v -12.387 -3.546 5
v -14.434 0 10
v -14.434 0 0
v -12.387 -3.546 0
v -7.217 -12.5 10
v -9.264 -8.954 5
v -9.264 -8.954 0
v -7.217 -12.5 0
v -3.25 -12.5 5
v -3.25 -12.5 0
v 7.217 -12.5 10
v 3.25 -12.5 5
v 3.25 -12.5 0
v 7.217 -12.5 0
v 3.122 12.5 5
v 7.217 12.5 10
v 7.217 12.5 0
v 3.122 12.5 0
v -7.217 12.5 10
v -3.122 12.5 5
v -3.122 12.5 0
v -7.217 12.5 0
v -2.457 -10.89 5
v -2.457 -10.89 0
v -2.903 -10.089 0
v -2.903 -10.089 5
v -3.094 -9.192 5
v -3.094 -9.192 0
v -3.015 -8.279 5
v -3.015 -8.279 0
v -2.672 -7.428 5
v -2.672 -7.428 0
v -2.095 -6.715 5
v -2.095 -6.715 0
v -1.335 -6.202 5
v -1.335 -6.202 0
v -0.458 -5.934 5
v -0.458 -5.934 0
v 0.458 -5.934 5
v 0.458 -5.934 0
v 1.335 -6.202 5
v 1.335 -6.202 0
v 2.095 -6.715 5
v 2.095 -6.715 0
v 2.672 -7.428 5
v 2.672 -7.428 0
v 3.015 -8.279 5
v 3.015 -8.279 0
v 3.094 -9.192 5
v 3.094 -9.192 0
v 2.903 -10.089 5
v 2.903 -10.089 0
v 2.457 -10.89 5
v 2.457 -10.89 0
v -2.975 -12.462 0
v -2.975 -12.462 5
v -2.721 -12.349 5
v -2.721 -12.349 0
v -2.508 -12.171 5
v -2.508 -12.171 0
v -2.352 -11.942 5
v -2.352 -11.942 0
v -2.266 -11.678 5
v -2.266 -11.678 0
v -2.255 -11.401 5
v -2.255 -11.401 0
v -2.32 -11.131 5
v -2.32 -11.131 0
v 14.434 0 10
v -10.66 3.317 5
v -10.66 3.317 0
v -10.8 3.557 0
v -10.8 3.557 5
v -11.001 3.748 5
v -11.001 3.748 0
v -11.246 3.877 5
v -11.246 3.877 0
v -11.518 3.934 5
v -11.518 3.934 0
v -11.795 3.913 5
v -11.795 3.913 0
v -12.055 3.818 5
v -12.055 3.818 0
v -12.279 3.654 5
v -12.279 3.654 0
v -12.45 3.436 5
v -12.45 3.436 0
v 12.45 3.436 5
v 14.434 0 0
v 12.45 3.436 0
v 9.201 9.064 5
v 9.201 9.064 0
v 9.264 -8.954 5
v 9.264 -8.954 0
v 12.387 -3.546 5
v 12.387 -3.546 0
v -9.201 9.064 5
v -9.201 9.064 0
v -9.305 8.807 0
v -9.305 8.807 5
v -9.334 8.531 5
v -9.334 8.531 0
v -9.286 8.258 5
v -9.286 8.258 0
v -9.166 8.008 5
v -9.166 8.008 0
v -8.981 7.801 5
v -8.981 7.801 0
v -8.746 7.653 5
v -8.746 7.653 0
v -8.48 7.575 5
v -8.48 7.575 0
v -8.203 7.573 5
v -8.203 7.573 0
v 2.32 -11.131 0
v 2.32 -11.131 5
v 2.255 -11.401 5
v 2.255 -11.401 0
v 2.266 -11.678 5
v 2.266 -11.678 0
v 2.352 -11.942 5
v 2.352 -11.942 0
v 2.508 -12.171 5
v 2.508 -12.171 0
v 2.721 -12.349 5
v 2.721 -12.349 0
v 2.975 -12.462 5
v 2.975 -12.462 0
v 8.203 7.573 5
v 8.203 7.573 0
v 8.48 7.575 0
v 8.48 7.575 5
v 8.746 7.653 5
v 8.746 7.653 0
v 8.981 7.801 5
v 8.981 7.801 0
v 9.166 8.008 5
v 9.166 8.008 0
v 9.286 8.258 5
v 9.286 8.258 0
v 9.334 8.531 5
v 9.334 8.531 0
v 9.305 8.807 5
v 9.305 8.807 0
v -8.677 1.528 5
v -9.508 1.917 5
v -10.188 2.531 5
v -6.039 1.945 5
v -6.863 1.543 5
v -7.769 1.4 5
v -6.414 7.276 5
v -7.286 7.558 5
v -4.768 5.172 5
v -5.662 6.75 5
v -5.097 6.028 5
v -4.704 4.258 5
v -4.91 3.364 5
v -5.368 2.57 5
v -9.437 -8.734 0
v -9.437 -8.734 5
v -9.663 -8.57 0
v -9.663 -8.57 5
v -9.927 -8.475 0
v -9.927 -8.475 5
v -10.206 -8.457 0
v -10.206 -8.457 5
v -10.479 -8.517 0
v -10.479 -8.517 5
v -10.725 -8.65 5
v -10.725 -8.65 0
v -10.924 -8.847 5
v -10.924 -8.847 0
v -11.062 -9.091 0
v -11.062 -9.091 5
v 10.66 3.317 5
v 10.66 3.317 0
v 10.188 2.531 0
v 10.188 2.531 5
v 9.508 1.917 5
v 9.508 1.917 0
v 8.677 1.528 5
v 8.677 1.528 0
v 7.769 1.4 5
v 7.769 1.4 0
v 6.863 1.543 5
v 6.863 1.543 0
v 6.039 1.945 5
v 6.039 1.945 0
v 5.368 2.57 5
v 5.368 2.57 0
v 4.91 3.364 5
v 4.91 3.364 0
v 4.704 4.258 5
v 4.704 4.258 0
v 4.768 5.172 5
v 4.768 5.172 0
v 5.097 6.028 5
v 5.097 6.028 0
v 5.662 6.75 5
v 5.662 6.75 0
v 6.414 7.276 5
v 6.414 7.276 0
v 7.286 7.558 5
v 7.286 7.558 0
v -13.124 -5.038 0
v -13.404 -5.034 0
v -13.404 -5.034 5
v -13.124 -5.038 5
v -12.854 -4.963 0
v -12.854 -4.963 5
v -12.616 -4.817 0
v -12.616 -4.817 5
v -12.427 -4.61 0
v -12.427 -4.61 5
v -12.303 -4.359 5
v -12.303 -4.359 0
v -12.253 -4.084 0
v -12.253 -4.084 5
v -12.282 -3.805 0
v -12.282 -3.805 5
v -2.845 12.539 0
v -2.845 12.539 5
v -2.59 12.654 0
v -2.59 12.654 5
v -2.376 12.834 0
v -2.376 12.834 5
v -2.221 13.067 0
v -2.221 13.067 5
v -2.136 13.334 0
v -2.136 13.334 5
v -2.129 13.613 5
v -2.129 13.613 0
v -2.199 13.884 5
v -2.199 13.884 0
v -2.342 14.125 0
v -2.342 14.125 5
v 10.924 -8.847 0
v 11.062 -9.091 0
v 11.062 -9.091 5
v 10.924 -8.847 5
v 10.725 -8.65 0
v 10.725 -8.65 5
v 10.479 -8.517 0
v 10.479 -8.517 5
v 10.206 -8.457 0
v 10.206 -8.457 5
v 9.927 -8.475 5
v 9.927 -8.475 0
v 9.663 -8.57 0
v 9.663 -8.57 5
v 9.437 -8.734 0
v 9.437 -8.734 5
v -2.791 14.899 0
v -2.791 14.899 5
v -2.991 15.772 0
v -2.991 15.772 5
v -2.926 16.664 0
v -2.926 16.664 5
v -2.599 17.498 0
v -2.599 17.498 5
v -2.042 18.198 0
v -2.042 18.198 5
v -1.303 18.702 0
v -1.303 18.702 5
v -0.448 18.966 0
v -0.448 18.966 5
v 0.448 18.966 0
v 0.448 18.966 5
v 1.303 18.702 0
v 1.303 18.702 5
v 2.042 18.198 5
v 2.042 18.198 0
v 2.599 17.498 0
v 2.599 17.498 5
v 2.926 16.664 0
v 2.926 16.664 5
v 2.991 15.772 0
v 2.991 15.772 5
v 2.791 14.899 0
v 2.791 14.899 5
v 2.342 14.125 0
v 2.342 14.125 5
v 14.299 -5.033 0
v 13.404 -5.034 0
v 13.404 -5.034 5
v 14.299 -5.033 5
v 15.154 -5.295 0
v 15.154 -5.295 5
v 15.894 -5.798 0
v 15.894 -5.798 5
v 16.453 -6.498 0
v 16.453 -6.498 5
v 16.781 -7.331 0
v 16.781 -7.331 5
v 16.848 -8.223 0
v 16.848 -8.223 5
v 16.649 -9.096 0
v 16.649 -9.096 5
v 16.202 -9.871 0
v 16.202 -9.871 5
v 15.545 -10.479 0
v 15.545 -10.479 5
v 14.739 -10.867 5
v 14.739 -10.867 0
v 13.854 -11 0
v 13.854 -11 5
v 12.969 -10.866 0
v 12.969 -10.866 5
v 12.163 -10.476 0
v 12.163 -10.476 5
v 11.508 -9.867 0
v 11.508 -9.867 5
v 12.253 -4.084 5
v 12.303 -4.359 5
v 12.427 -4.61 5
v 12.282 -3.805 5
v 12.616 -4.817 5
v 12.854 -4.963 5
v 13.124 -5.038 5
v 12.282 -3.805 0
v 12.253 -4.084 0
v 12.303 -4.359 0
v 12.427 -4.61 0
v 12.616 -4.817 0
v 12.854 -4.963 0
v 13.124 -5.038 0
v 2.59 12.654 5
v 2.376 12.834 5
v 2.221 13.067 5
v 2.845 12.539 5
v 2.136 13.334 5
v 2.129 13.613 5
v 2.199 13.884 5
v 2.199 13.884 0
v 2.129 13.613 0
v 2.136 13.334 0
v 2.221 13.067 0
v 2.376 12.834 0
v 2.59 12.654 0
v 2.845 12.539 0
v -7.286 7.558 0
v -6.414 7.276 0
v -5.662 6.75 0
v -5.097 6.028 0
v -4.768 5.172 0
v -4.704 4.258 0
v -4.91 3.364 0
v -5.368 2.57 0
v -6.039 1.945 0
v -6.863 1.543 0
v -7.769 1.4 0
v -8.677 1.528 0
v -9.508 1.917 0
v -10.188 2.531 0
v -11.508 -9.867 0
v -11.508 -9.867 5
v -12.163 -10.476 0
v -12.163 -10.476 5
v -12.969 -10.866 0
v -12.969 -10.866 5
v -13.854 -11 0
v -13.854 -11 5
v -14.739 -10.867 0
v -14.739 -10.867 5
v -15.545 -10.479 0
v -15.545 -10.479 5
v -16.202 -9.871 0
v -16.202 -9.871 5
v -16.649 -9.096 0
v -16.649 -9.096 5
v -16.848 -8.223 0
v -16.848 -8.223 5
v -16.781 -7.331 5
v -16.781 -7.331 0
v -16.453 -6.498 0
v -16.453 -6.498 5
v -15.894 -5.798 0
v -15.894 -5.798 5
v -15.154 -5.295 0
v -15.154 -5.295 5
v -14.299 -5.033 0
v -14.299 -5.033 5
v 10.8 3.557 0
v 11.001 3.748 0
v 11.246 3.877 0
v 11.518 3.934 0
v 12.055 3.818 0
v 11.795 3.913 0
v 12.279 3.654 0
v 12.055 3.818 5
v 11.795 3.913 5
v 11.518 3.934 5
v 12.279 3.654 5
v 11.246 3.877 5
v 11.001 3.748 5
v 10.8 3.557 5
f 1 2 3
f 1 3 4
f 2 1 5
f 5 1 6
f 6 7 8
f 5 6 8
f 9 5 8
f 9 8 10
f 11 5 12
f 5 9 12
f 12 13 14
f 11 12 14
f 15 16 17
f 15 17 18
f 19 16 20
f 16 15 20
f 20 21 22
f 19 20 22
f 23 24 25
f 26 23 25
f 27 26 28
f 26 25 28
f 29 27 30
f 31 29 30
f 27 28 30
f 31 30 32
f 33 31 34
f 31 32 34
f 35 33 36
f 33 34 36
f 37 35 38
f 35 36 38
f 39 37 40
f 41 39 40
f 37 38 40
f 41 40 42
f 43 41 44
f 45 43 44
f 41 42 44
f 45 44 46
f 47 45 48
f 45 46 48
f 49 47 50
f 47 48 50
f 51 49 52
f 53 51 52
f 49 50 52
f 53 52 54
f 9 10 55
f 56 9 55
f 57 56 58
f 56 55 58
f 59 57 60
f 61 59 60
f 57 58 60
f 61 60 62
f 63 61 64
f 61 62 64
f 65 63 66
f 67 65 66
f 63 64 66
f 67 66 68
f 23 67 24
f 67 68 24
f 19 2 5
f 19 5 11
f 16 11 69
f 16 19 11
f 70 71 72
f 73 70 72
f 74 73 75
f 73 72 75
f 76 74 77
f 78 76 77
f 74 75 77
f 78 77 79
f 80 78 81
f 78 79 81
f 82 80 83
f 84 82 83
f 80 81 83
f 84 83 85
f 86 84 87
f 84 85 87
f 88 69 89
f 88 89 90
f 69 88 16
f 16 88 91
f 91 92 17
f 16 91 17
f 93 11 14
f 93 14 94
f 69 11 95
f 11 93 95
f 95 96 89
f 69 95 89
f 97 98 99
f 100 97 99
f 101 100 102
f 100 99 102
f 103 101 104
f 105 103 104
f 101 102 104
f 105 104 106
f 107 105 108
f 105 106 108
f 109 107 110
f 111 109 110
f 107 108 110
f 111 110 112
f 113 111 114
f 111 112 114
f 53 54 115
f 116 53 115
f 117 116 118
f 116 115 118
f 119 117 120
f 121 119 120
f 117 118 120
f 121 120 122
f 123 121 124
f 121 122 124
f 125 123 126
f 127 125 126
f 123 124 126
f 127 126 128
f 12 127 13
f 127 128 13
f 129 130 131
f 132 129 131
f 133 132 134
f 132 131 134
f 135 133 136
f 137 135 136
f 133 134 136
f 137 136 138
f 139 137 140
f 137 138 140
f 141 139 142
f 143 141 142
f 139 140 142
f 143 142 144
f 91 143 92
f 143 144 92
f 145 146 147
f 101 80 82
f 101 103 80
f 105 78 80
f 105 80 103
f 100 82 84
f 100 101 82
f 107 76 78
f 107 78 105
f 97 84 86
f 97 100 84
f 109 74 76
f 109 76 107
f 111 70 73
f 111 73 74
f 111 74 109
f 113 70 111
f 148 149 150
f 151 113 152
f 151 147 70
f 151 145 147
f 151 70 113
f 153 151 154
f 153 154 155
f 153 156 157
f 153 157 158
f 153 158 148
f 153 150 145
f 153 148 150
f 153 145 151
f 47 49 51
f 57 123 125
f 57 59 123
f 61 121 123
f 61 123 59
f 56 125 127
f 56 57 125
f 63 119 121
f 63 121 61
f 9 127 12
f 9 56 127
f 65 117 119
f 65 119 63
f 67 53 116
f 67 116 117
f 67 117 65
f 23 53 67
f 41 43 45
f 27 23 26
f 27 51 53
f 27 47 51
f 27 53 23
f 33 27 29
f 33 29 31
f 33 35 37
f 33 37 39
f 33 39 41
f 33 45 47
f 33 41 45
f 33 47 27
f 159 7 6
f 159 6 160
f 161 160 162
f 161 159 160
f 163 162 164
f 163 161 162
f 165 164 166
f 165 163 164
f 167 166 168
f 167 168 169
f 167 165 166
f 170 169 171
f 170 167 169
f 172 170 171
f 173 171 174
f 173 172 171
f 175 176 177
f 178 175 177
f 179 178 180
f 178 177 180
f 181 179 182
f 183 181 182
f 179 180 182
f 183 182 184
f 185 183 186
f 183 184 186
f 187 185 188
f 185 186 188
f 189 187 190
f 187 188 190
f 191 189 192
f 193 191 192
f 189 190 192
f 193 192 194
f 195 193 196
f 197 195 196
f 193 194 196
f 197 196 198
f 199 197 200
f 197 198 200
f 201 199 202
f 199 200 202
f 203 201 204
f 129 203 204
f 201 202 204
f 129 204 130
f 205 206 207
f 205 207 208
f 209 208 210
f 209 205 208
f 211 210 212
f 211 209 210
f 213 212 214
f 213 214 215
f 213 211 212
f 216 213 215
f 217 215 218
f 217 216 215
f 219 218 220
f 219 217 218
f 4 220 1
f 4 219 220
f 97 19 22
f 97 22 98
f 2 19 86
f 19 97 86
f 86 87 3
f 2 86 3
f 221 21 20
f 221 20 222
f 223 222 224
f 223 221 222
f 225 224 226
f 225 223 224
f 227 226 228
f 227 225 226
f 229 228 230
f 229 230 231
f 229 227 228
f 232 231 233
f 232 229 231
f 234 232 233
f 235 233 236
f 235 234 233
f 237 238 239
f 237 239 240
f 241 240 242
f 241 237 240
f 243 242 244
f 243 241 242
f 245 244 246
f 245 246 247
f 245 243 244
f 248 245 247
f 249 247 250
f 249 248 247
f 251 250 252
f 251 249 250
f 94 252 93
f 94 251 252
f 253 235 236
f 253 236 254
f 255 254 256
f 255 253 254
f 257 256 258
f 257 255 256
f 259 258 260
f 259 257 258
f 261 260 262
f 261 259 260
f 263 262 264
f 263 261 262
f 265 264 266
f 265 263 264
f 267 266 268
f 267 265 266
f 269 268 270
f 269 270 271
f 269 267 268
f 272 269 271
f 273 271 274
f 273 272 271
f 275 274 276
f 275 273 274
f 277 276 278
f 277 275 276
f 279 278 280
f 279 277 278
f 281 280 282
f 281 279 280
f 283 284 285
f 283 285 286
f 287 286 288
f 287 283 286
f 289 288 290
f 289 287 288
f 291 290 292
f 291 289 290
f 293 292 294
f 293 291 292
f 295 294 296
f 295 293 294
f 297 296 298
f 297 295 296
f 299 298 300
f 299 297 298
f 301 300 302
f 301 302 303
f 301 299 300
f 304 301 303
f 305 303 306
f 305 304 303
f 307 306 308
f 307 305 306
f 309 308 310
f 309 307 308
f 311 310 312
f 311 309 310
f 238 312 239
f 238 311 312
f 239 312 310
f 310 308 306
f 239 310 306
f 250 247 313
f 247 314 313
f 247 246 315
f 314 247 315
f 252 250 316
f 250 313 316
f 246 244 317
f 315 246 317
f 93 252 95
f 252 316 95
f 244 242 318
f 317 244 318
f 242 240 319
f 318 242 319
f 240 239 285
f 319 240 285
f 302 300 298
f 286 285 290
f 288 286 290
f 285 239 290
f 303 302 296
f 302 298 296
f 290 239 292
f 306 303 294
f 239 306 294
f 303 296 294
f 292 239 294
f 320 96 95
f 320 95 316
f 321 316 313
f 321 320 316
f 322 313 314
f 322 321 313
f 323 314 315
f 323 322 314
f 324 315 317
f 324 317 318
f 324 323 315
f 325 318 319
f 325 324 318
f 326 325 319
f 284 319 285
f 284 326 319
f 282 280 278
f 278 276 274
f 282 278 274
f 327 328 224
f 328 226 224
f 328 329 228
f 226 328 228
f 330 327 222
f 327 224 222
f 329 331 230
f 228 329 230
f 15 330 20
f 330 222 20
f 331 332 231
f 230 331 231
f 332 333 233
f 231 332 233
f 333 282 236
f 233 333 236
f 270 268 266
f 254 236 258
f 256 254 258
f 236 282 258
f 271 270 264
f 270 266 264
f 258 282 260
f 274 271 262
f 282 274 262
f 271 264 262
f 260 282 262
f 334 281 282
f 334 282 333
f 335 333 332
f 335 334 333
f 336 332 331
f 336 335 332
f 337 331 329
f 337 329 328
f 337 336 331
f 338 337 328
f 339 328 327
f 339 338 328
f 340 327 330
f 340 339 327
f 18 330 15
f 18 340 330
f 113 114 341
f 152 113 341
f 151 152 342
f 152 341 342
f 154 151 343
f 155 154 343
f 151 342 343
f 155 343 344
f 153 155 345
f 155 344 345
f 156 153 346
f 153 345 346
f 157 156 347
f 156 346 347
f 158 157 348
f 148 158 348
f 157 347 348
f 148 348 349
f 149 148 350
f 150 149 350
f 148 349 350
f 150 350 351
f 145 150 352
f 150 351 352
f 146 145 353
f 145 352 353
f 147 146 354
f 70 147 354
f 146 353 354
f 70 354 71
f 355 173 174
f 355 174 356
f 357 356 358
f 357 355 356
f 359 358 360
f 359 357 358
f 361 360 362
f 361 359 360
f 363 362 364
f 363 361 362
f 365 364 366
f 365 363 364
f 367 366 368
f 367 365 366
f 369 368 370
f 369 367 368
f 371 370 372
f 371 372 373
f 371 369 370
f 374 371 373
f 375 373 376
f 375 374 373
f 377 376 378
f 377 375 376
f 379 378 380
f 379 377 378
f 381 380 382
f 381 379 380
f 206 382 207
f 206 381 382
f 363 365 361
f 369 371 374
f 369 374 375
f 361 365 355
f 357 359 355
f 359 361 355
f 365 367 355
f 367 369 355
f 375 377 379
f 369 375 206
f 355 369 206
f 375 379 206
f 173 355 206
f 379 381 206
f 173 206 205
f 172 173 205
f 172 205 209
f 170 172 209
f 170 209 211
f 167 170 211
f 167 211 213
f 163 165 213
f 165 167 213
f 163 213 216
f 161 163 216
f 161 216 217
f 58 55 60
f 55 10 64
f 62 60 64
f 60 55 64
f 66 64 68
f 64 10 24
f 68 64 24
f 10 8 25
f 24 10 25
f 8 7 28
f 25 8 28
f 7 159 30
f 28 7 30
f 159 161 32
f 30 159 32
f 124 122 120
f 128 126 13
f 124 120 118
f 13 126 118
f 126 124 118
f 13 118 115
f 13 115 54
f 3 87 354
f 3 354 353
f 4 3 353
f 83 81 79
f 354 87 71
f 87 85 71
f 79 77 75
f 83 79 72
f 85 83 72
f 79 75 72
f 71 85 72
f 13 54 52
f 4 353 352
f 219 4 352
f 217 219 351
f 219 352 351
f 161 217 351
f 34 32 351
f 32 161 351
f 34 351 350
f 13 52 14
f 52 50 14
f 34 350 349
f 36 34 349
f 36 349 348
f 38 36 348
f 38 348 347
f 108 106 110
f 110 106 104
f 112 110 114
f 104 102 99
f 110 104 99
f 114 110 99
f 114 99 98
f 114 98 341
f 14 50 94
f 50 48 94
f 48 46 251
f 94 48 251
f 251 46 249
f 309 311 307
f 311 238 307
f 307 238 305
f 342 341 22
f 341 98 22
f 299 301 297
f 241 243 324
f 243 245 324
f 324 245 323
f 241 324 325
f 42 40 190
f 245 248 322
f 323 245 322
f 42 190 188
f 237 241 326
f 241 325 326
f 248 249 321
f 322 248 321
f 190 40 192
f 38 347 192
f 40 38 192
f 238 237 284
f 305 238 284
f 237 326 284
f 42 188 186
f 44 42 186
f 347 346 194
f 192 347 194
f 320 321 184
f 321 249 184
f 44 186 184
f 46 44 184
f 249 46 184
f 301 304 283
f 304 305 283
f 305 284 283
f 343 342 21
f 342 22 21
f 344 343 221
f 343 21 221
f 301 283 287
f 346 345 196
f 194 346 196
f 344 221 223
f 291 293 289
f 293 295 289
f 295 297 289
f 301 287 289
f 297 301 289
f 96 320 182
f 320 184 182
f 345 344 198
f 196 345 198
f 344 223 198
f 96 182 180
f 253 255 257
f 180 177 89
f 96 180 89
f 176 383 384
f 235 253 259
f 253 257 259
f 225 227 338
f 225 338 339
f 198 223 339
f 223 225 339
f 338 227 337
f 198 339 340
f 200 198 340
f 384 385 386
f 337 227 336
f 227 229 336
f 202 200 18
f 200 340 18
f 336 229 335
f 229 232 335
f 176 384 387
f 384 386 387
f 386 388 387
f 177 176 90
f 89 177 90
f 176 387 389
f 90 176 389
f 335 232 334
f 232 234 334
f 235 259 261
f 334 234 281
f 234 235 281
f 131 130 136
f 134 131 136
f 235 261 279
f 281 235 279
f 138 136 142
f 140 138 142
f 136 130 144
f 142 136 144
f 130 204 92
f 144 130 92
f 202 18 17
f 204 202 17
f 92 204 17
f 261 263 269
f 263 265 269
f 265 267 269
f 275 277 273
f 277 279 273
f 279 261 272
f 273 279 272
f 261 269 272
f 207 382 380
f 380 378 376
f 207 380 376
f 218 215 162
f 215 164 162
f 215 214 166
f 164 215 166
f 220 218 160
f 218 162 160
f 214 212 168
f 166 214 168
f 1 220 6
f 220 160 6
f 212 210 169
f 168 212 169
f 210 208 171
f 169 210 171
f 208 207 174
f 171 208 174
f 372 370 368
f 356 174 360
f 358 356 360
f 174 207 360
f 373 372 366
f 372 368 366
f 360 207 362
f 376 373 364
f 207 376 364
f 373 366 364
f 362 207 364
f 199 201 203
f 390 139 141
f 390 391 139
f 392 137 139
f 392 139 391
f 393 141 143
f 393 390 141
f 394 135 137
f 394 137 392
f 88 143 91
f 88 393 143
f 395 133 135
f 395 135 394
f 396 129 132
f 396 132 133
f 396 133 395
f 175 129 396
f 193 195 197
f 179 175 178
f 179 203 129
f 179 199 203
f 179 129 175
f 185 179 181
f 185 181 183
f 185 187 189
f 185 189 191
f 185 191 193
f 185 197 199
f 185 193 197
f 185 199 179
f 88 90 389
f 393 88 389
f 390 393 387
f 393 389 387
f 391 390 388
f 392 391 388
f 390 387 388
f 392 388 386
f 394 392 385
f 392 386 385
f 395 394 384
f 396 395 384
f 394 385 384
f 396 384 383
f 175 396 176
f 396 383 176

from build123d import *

# Parameters (mm, degrees)
EXTRUDE_1_DEPTH          = 10
EXTRUDE_2_DEPTH          = 5
CUT_EXTRUDE_2_DEPTH      = 5
PATTERN_CIRCULAR_1_COUNT = 3


with BuildPart() as part:
    # 草图1 → 凸台-拉伸1 (new body)
    with BuildSketch(Plane.XY):
        Polygon((14.43375673, 0), (7.216878365, 12.5), (-7.216878365, 12.5), (-14.43375673, 0), (-7.216878365, -12.5), (7.216878365, -12.5), align=None)
    extrude(amount=EXTRUDE_1_DEPTH)

    # 草图2 → 凸台-拉伸2 (add)
    with BuildSketch(Plane(origin=(0, 0, 0), x_dir=(-1, 0, 0), z_dir=(0, 0, -1))):
        with BuildLine():
            Line((-3.122498999, 12.5), (3.122498999, 12.5))
            ThreePointArc((3.122498999, 12.5), (2.22111118, 13.066987298), (2.341874249, 14.125))
            ThreePointArc((2.341874249, 14.125), (0, 19), (-2.341874249, 14.125))
            ThreePointArc((-2.341874249, 14.125), (-2.22111118, 13.066987298), (-3.122498999, 12.5))
        make_face()
    extrude_2 = extrude(amount=-EXTRUDE_2_DEPTH)

    # 草图3 → 切除-拉伸2 (cut)
    with BuildSketch(Plane(origin=(0, 0, 0), x_dir=(-1, 0, 0), z_dir=(0, 0, -1))):
        with BuildLine():
            ThreePointArc((-2.457026249, -10.890243902), (-2.352465403, -11.941726104), (-3.249615362, -12.5))
            Line((-3.249615362, -12.5), (0, -12.5))
            Line((0, -12.5), (3.249615362, -12.5))
            ThreePointArc((3.249615362, -12.5), (2.352465403, -11.941726104), (2.457026249, -10.890243902))
            ThreePointArc((2.457026249, -10.890243902), (0, -5.9), (-2.457026249, -10.890243902))
        make_face()
    cut_extrude_2 = extrude(amount=-CUT_EXTRUDE_2_DEPTH, mode=Mode.SUBTRACT)

    # 阵列(圆周)1: 凸台-拉伸2, 切除-拉伸2 ×3 about axis
    pattern_circular_1_axis = Axis((0, 0, 0), (0, 0, -1))
    add([extrude_2.rotate(pattern_circular_1_axis, i * 360 / PATTERN_CIRCULAR_1_COUNT) for i in range(1, PATTERN_CIRCULAR_1_COUNT)])
    add([cut_extrude_2.rotate(pattern_circular_1_axis, i * 360 / PATTERN_CIRCULAR_1_COUNT) for i in range(1, PATTERN_CIRCULAR_1_COUNT)], mode=Mode.SUBTRACT)


solid = part.part
